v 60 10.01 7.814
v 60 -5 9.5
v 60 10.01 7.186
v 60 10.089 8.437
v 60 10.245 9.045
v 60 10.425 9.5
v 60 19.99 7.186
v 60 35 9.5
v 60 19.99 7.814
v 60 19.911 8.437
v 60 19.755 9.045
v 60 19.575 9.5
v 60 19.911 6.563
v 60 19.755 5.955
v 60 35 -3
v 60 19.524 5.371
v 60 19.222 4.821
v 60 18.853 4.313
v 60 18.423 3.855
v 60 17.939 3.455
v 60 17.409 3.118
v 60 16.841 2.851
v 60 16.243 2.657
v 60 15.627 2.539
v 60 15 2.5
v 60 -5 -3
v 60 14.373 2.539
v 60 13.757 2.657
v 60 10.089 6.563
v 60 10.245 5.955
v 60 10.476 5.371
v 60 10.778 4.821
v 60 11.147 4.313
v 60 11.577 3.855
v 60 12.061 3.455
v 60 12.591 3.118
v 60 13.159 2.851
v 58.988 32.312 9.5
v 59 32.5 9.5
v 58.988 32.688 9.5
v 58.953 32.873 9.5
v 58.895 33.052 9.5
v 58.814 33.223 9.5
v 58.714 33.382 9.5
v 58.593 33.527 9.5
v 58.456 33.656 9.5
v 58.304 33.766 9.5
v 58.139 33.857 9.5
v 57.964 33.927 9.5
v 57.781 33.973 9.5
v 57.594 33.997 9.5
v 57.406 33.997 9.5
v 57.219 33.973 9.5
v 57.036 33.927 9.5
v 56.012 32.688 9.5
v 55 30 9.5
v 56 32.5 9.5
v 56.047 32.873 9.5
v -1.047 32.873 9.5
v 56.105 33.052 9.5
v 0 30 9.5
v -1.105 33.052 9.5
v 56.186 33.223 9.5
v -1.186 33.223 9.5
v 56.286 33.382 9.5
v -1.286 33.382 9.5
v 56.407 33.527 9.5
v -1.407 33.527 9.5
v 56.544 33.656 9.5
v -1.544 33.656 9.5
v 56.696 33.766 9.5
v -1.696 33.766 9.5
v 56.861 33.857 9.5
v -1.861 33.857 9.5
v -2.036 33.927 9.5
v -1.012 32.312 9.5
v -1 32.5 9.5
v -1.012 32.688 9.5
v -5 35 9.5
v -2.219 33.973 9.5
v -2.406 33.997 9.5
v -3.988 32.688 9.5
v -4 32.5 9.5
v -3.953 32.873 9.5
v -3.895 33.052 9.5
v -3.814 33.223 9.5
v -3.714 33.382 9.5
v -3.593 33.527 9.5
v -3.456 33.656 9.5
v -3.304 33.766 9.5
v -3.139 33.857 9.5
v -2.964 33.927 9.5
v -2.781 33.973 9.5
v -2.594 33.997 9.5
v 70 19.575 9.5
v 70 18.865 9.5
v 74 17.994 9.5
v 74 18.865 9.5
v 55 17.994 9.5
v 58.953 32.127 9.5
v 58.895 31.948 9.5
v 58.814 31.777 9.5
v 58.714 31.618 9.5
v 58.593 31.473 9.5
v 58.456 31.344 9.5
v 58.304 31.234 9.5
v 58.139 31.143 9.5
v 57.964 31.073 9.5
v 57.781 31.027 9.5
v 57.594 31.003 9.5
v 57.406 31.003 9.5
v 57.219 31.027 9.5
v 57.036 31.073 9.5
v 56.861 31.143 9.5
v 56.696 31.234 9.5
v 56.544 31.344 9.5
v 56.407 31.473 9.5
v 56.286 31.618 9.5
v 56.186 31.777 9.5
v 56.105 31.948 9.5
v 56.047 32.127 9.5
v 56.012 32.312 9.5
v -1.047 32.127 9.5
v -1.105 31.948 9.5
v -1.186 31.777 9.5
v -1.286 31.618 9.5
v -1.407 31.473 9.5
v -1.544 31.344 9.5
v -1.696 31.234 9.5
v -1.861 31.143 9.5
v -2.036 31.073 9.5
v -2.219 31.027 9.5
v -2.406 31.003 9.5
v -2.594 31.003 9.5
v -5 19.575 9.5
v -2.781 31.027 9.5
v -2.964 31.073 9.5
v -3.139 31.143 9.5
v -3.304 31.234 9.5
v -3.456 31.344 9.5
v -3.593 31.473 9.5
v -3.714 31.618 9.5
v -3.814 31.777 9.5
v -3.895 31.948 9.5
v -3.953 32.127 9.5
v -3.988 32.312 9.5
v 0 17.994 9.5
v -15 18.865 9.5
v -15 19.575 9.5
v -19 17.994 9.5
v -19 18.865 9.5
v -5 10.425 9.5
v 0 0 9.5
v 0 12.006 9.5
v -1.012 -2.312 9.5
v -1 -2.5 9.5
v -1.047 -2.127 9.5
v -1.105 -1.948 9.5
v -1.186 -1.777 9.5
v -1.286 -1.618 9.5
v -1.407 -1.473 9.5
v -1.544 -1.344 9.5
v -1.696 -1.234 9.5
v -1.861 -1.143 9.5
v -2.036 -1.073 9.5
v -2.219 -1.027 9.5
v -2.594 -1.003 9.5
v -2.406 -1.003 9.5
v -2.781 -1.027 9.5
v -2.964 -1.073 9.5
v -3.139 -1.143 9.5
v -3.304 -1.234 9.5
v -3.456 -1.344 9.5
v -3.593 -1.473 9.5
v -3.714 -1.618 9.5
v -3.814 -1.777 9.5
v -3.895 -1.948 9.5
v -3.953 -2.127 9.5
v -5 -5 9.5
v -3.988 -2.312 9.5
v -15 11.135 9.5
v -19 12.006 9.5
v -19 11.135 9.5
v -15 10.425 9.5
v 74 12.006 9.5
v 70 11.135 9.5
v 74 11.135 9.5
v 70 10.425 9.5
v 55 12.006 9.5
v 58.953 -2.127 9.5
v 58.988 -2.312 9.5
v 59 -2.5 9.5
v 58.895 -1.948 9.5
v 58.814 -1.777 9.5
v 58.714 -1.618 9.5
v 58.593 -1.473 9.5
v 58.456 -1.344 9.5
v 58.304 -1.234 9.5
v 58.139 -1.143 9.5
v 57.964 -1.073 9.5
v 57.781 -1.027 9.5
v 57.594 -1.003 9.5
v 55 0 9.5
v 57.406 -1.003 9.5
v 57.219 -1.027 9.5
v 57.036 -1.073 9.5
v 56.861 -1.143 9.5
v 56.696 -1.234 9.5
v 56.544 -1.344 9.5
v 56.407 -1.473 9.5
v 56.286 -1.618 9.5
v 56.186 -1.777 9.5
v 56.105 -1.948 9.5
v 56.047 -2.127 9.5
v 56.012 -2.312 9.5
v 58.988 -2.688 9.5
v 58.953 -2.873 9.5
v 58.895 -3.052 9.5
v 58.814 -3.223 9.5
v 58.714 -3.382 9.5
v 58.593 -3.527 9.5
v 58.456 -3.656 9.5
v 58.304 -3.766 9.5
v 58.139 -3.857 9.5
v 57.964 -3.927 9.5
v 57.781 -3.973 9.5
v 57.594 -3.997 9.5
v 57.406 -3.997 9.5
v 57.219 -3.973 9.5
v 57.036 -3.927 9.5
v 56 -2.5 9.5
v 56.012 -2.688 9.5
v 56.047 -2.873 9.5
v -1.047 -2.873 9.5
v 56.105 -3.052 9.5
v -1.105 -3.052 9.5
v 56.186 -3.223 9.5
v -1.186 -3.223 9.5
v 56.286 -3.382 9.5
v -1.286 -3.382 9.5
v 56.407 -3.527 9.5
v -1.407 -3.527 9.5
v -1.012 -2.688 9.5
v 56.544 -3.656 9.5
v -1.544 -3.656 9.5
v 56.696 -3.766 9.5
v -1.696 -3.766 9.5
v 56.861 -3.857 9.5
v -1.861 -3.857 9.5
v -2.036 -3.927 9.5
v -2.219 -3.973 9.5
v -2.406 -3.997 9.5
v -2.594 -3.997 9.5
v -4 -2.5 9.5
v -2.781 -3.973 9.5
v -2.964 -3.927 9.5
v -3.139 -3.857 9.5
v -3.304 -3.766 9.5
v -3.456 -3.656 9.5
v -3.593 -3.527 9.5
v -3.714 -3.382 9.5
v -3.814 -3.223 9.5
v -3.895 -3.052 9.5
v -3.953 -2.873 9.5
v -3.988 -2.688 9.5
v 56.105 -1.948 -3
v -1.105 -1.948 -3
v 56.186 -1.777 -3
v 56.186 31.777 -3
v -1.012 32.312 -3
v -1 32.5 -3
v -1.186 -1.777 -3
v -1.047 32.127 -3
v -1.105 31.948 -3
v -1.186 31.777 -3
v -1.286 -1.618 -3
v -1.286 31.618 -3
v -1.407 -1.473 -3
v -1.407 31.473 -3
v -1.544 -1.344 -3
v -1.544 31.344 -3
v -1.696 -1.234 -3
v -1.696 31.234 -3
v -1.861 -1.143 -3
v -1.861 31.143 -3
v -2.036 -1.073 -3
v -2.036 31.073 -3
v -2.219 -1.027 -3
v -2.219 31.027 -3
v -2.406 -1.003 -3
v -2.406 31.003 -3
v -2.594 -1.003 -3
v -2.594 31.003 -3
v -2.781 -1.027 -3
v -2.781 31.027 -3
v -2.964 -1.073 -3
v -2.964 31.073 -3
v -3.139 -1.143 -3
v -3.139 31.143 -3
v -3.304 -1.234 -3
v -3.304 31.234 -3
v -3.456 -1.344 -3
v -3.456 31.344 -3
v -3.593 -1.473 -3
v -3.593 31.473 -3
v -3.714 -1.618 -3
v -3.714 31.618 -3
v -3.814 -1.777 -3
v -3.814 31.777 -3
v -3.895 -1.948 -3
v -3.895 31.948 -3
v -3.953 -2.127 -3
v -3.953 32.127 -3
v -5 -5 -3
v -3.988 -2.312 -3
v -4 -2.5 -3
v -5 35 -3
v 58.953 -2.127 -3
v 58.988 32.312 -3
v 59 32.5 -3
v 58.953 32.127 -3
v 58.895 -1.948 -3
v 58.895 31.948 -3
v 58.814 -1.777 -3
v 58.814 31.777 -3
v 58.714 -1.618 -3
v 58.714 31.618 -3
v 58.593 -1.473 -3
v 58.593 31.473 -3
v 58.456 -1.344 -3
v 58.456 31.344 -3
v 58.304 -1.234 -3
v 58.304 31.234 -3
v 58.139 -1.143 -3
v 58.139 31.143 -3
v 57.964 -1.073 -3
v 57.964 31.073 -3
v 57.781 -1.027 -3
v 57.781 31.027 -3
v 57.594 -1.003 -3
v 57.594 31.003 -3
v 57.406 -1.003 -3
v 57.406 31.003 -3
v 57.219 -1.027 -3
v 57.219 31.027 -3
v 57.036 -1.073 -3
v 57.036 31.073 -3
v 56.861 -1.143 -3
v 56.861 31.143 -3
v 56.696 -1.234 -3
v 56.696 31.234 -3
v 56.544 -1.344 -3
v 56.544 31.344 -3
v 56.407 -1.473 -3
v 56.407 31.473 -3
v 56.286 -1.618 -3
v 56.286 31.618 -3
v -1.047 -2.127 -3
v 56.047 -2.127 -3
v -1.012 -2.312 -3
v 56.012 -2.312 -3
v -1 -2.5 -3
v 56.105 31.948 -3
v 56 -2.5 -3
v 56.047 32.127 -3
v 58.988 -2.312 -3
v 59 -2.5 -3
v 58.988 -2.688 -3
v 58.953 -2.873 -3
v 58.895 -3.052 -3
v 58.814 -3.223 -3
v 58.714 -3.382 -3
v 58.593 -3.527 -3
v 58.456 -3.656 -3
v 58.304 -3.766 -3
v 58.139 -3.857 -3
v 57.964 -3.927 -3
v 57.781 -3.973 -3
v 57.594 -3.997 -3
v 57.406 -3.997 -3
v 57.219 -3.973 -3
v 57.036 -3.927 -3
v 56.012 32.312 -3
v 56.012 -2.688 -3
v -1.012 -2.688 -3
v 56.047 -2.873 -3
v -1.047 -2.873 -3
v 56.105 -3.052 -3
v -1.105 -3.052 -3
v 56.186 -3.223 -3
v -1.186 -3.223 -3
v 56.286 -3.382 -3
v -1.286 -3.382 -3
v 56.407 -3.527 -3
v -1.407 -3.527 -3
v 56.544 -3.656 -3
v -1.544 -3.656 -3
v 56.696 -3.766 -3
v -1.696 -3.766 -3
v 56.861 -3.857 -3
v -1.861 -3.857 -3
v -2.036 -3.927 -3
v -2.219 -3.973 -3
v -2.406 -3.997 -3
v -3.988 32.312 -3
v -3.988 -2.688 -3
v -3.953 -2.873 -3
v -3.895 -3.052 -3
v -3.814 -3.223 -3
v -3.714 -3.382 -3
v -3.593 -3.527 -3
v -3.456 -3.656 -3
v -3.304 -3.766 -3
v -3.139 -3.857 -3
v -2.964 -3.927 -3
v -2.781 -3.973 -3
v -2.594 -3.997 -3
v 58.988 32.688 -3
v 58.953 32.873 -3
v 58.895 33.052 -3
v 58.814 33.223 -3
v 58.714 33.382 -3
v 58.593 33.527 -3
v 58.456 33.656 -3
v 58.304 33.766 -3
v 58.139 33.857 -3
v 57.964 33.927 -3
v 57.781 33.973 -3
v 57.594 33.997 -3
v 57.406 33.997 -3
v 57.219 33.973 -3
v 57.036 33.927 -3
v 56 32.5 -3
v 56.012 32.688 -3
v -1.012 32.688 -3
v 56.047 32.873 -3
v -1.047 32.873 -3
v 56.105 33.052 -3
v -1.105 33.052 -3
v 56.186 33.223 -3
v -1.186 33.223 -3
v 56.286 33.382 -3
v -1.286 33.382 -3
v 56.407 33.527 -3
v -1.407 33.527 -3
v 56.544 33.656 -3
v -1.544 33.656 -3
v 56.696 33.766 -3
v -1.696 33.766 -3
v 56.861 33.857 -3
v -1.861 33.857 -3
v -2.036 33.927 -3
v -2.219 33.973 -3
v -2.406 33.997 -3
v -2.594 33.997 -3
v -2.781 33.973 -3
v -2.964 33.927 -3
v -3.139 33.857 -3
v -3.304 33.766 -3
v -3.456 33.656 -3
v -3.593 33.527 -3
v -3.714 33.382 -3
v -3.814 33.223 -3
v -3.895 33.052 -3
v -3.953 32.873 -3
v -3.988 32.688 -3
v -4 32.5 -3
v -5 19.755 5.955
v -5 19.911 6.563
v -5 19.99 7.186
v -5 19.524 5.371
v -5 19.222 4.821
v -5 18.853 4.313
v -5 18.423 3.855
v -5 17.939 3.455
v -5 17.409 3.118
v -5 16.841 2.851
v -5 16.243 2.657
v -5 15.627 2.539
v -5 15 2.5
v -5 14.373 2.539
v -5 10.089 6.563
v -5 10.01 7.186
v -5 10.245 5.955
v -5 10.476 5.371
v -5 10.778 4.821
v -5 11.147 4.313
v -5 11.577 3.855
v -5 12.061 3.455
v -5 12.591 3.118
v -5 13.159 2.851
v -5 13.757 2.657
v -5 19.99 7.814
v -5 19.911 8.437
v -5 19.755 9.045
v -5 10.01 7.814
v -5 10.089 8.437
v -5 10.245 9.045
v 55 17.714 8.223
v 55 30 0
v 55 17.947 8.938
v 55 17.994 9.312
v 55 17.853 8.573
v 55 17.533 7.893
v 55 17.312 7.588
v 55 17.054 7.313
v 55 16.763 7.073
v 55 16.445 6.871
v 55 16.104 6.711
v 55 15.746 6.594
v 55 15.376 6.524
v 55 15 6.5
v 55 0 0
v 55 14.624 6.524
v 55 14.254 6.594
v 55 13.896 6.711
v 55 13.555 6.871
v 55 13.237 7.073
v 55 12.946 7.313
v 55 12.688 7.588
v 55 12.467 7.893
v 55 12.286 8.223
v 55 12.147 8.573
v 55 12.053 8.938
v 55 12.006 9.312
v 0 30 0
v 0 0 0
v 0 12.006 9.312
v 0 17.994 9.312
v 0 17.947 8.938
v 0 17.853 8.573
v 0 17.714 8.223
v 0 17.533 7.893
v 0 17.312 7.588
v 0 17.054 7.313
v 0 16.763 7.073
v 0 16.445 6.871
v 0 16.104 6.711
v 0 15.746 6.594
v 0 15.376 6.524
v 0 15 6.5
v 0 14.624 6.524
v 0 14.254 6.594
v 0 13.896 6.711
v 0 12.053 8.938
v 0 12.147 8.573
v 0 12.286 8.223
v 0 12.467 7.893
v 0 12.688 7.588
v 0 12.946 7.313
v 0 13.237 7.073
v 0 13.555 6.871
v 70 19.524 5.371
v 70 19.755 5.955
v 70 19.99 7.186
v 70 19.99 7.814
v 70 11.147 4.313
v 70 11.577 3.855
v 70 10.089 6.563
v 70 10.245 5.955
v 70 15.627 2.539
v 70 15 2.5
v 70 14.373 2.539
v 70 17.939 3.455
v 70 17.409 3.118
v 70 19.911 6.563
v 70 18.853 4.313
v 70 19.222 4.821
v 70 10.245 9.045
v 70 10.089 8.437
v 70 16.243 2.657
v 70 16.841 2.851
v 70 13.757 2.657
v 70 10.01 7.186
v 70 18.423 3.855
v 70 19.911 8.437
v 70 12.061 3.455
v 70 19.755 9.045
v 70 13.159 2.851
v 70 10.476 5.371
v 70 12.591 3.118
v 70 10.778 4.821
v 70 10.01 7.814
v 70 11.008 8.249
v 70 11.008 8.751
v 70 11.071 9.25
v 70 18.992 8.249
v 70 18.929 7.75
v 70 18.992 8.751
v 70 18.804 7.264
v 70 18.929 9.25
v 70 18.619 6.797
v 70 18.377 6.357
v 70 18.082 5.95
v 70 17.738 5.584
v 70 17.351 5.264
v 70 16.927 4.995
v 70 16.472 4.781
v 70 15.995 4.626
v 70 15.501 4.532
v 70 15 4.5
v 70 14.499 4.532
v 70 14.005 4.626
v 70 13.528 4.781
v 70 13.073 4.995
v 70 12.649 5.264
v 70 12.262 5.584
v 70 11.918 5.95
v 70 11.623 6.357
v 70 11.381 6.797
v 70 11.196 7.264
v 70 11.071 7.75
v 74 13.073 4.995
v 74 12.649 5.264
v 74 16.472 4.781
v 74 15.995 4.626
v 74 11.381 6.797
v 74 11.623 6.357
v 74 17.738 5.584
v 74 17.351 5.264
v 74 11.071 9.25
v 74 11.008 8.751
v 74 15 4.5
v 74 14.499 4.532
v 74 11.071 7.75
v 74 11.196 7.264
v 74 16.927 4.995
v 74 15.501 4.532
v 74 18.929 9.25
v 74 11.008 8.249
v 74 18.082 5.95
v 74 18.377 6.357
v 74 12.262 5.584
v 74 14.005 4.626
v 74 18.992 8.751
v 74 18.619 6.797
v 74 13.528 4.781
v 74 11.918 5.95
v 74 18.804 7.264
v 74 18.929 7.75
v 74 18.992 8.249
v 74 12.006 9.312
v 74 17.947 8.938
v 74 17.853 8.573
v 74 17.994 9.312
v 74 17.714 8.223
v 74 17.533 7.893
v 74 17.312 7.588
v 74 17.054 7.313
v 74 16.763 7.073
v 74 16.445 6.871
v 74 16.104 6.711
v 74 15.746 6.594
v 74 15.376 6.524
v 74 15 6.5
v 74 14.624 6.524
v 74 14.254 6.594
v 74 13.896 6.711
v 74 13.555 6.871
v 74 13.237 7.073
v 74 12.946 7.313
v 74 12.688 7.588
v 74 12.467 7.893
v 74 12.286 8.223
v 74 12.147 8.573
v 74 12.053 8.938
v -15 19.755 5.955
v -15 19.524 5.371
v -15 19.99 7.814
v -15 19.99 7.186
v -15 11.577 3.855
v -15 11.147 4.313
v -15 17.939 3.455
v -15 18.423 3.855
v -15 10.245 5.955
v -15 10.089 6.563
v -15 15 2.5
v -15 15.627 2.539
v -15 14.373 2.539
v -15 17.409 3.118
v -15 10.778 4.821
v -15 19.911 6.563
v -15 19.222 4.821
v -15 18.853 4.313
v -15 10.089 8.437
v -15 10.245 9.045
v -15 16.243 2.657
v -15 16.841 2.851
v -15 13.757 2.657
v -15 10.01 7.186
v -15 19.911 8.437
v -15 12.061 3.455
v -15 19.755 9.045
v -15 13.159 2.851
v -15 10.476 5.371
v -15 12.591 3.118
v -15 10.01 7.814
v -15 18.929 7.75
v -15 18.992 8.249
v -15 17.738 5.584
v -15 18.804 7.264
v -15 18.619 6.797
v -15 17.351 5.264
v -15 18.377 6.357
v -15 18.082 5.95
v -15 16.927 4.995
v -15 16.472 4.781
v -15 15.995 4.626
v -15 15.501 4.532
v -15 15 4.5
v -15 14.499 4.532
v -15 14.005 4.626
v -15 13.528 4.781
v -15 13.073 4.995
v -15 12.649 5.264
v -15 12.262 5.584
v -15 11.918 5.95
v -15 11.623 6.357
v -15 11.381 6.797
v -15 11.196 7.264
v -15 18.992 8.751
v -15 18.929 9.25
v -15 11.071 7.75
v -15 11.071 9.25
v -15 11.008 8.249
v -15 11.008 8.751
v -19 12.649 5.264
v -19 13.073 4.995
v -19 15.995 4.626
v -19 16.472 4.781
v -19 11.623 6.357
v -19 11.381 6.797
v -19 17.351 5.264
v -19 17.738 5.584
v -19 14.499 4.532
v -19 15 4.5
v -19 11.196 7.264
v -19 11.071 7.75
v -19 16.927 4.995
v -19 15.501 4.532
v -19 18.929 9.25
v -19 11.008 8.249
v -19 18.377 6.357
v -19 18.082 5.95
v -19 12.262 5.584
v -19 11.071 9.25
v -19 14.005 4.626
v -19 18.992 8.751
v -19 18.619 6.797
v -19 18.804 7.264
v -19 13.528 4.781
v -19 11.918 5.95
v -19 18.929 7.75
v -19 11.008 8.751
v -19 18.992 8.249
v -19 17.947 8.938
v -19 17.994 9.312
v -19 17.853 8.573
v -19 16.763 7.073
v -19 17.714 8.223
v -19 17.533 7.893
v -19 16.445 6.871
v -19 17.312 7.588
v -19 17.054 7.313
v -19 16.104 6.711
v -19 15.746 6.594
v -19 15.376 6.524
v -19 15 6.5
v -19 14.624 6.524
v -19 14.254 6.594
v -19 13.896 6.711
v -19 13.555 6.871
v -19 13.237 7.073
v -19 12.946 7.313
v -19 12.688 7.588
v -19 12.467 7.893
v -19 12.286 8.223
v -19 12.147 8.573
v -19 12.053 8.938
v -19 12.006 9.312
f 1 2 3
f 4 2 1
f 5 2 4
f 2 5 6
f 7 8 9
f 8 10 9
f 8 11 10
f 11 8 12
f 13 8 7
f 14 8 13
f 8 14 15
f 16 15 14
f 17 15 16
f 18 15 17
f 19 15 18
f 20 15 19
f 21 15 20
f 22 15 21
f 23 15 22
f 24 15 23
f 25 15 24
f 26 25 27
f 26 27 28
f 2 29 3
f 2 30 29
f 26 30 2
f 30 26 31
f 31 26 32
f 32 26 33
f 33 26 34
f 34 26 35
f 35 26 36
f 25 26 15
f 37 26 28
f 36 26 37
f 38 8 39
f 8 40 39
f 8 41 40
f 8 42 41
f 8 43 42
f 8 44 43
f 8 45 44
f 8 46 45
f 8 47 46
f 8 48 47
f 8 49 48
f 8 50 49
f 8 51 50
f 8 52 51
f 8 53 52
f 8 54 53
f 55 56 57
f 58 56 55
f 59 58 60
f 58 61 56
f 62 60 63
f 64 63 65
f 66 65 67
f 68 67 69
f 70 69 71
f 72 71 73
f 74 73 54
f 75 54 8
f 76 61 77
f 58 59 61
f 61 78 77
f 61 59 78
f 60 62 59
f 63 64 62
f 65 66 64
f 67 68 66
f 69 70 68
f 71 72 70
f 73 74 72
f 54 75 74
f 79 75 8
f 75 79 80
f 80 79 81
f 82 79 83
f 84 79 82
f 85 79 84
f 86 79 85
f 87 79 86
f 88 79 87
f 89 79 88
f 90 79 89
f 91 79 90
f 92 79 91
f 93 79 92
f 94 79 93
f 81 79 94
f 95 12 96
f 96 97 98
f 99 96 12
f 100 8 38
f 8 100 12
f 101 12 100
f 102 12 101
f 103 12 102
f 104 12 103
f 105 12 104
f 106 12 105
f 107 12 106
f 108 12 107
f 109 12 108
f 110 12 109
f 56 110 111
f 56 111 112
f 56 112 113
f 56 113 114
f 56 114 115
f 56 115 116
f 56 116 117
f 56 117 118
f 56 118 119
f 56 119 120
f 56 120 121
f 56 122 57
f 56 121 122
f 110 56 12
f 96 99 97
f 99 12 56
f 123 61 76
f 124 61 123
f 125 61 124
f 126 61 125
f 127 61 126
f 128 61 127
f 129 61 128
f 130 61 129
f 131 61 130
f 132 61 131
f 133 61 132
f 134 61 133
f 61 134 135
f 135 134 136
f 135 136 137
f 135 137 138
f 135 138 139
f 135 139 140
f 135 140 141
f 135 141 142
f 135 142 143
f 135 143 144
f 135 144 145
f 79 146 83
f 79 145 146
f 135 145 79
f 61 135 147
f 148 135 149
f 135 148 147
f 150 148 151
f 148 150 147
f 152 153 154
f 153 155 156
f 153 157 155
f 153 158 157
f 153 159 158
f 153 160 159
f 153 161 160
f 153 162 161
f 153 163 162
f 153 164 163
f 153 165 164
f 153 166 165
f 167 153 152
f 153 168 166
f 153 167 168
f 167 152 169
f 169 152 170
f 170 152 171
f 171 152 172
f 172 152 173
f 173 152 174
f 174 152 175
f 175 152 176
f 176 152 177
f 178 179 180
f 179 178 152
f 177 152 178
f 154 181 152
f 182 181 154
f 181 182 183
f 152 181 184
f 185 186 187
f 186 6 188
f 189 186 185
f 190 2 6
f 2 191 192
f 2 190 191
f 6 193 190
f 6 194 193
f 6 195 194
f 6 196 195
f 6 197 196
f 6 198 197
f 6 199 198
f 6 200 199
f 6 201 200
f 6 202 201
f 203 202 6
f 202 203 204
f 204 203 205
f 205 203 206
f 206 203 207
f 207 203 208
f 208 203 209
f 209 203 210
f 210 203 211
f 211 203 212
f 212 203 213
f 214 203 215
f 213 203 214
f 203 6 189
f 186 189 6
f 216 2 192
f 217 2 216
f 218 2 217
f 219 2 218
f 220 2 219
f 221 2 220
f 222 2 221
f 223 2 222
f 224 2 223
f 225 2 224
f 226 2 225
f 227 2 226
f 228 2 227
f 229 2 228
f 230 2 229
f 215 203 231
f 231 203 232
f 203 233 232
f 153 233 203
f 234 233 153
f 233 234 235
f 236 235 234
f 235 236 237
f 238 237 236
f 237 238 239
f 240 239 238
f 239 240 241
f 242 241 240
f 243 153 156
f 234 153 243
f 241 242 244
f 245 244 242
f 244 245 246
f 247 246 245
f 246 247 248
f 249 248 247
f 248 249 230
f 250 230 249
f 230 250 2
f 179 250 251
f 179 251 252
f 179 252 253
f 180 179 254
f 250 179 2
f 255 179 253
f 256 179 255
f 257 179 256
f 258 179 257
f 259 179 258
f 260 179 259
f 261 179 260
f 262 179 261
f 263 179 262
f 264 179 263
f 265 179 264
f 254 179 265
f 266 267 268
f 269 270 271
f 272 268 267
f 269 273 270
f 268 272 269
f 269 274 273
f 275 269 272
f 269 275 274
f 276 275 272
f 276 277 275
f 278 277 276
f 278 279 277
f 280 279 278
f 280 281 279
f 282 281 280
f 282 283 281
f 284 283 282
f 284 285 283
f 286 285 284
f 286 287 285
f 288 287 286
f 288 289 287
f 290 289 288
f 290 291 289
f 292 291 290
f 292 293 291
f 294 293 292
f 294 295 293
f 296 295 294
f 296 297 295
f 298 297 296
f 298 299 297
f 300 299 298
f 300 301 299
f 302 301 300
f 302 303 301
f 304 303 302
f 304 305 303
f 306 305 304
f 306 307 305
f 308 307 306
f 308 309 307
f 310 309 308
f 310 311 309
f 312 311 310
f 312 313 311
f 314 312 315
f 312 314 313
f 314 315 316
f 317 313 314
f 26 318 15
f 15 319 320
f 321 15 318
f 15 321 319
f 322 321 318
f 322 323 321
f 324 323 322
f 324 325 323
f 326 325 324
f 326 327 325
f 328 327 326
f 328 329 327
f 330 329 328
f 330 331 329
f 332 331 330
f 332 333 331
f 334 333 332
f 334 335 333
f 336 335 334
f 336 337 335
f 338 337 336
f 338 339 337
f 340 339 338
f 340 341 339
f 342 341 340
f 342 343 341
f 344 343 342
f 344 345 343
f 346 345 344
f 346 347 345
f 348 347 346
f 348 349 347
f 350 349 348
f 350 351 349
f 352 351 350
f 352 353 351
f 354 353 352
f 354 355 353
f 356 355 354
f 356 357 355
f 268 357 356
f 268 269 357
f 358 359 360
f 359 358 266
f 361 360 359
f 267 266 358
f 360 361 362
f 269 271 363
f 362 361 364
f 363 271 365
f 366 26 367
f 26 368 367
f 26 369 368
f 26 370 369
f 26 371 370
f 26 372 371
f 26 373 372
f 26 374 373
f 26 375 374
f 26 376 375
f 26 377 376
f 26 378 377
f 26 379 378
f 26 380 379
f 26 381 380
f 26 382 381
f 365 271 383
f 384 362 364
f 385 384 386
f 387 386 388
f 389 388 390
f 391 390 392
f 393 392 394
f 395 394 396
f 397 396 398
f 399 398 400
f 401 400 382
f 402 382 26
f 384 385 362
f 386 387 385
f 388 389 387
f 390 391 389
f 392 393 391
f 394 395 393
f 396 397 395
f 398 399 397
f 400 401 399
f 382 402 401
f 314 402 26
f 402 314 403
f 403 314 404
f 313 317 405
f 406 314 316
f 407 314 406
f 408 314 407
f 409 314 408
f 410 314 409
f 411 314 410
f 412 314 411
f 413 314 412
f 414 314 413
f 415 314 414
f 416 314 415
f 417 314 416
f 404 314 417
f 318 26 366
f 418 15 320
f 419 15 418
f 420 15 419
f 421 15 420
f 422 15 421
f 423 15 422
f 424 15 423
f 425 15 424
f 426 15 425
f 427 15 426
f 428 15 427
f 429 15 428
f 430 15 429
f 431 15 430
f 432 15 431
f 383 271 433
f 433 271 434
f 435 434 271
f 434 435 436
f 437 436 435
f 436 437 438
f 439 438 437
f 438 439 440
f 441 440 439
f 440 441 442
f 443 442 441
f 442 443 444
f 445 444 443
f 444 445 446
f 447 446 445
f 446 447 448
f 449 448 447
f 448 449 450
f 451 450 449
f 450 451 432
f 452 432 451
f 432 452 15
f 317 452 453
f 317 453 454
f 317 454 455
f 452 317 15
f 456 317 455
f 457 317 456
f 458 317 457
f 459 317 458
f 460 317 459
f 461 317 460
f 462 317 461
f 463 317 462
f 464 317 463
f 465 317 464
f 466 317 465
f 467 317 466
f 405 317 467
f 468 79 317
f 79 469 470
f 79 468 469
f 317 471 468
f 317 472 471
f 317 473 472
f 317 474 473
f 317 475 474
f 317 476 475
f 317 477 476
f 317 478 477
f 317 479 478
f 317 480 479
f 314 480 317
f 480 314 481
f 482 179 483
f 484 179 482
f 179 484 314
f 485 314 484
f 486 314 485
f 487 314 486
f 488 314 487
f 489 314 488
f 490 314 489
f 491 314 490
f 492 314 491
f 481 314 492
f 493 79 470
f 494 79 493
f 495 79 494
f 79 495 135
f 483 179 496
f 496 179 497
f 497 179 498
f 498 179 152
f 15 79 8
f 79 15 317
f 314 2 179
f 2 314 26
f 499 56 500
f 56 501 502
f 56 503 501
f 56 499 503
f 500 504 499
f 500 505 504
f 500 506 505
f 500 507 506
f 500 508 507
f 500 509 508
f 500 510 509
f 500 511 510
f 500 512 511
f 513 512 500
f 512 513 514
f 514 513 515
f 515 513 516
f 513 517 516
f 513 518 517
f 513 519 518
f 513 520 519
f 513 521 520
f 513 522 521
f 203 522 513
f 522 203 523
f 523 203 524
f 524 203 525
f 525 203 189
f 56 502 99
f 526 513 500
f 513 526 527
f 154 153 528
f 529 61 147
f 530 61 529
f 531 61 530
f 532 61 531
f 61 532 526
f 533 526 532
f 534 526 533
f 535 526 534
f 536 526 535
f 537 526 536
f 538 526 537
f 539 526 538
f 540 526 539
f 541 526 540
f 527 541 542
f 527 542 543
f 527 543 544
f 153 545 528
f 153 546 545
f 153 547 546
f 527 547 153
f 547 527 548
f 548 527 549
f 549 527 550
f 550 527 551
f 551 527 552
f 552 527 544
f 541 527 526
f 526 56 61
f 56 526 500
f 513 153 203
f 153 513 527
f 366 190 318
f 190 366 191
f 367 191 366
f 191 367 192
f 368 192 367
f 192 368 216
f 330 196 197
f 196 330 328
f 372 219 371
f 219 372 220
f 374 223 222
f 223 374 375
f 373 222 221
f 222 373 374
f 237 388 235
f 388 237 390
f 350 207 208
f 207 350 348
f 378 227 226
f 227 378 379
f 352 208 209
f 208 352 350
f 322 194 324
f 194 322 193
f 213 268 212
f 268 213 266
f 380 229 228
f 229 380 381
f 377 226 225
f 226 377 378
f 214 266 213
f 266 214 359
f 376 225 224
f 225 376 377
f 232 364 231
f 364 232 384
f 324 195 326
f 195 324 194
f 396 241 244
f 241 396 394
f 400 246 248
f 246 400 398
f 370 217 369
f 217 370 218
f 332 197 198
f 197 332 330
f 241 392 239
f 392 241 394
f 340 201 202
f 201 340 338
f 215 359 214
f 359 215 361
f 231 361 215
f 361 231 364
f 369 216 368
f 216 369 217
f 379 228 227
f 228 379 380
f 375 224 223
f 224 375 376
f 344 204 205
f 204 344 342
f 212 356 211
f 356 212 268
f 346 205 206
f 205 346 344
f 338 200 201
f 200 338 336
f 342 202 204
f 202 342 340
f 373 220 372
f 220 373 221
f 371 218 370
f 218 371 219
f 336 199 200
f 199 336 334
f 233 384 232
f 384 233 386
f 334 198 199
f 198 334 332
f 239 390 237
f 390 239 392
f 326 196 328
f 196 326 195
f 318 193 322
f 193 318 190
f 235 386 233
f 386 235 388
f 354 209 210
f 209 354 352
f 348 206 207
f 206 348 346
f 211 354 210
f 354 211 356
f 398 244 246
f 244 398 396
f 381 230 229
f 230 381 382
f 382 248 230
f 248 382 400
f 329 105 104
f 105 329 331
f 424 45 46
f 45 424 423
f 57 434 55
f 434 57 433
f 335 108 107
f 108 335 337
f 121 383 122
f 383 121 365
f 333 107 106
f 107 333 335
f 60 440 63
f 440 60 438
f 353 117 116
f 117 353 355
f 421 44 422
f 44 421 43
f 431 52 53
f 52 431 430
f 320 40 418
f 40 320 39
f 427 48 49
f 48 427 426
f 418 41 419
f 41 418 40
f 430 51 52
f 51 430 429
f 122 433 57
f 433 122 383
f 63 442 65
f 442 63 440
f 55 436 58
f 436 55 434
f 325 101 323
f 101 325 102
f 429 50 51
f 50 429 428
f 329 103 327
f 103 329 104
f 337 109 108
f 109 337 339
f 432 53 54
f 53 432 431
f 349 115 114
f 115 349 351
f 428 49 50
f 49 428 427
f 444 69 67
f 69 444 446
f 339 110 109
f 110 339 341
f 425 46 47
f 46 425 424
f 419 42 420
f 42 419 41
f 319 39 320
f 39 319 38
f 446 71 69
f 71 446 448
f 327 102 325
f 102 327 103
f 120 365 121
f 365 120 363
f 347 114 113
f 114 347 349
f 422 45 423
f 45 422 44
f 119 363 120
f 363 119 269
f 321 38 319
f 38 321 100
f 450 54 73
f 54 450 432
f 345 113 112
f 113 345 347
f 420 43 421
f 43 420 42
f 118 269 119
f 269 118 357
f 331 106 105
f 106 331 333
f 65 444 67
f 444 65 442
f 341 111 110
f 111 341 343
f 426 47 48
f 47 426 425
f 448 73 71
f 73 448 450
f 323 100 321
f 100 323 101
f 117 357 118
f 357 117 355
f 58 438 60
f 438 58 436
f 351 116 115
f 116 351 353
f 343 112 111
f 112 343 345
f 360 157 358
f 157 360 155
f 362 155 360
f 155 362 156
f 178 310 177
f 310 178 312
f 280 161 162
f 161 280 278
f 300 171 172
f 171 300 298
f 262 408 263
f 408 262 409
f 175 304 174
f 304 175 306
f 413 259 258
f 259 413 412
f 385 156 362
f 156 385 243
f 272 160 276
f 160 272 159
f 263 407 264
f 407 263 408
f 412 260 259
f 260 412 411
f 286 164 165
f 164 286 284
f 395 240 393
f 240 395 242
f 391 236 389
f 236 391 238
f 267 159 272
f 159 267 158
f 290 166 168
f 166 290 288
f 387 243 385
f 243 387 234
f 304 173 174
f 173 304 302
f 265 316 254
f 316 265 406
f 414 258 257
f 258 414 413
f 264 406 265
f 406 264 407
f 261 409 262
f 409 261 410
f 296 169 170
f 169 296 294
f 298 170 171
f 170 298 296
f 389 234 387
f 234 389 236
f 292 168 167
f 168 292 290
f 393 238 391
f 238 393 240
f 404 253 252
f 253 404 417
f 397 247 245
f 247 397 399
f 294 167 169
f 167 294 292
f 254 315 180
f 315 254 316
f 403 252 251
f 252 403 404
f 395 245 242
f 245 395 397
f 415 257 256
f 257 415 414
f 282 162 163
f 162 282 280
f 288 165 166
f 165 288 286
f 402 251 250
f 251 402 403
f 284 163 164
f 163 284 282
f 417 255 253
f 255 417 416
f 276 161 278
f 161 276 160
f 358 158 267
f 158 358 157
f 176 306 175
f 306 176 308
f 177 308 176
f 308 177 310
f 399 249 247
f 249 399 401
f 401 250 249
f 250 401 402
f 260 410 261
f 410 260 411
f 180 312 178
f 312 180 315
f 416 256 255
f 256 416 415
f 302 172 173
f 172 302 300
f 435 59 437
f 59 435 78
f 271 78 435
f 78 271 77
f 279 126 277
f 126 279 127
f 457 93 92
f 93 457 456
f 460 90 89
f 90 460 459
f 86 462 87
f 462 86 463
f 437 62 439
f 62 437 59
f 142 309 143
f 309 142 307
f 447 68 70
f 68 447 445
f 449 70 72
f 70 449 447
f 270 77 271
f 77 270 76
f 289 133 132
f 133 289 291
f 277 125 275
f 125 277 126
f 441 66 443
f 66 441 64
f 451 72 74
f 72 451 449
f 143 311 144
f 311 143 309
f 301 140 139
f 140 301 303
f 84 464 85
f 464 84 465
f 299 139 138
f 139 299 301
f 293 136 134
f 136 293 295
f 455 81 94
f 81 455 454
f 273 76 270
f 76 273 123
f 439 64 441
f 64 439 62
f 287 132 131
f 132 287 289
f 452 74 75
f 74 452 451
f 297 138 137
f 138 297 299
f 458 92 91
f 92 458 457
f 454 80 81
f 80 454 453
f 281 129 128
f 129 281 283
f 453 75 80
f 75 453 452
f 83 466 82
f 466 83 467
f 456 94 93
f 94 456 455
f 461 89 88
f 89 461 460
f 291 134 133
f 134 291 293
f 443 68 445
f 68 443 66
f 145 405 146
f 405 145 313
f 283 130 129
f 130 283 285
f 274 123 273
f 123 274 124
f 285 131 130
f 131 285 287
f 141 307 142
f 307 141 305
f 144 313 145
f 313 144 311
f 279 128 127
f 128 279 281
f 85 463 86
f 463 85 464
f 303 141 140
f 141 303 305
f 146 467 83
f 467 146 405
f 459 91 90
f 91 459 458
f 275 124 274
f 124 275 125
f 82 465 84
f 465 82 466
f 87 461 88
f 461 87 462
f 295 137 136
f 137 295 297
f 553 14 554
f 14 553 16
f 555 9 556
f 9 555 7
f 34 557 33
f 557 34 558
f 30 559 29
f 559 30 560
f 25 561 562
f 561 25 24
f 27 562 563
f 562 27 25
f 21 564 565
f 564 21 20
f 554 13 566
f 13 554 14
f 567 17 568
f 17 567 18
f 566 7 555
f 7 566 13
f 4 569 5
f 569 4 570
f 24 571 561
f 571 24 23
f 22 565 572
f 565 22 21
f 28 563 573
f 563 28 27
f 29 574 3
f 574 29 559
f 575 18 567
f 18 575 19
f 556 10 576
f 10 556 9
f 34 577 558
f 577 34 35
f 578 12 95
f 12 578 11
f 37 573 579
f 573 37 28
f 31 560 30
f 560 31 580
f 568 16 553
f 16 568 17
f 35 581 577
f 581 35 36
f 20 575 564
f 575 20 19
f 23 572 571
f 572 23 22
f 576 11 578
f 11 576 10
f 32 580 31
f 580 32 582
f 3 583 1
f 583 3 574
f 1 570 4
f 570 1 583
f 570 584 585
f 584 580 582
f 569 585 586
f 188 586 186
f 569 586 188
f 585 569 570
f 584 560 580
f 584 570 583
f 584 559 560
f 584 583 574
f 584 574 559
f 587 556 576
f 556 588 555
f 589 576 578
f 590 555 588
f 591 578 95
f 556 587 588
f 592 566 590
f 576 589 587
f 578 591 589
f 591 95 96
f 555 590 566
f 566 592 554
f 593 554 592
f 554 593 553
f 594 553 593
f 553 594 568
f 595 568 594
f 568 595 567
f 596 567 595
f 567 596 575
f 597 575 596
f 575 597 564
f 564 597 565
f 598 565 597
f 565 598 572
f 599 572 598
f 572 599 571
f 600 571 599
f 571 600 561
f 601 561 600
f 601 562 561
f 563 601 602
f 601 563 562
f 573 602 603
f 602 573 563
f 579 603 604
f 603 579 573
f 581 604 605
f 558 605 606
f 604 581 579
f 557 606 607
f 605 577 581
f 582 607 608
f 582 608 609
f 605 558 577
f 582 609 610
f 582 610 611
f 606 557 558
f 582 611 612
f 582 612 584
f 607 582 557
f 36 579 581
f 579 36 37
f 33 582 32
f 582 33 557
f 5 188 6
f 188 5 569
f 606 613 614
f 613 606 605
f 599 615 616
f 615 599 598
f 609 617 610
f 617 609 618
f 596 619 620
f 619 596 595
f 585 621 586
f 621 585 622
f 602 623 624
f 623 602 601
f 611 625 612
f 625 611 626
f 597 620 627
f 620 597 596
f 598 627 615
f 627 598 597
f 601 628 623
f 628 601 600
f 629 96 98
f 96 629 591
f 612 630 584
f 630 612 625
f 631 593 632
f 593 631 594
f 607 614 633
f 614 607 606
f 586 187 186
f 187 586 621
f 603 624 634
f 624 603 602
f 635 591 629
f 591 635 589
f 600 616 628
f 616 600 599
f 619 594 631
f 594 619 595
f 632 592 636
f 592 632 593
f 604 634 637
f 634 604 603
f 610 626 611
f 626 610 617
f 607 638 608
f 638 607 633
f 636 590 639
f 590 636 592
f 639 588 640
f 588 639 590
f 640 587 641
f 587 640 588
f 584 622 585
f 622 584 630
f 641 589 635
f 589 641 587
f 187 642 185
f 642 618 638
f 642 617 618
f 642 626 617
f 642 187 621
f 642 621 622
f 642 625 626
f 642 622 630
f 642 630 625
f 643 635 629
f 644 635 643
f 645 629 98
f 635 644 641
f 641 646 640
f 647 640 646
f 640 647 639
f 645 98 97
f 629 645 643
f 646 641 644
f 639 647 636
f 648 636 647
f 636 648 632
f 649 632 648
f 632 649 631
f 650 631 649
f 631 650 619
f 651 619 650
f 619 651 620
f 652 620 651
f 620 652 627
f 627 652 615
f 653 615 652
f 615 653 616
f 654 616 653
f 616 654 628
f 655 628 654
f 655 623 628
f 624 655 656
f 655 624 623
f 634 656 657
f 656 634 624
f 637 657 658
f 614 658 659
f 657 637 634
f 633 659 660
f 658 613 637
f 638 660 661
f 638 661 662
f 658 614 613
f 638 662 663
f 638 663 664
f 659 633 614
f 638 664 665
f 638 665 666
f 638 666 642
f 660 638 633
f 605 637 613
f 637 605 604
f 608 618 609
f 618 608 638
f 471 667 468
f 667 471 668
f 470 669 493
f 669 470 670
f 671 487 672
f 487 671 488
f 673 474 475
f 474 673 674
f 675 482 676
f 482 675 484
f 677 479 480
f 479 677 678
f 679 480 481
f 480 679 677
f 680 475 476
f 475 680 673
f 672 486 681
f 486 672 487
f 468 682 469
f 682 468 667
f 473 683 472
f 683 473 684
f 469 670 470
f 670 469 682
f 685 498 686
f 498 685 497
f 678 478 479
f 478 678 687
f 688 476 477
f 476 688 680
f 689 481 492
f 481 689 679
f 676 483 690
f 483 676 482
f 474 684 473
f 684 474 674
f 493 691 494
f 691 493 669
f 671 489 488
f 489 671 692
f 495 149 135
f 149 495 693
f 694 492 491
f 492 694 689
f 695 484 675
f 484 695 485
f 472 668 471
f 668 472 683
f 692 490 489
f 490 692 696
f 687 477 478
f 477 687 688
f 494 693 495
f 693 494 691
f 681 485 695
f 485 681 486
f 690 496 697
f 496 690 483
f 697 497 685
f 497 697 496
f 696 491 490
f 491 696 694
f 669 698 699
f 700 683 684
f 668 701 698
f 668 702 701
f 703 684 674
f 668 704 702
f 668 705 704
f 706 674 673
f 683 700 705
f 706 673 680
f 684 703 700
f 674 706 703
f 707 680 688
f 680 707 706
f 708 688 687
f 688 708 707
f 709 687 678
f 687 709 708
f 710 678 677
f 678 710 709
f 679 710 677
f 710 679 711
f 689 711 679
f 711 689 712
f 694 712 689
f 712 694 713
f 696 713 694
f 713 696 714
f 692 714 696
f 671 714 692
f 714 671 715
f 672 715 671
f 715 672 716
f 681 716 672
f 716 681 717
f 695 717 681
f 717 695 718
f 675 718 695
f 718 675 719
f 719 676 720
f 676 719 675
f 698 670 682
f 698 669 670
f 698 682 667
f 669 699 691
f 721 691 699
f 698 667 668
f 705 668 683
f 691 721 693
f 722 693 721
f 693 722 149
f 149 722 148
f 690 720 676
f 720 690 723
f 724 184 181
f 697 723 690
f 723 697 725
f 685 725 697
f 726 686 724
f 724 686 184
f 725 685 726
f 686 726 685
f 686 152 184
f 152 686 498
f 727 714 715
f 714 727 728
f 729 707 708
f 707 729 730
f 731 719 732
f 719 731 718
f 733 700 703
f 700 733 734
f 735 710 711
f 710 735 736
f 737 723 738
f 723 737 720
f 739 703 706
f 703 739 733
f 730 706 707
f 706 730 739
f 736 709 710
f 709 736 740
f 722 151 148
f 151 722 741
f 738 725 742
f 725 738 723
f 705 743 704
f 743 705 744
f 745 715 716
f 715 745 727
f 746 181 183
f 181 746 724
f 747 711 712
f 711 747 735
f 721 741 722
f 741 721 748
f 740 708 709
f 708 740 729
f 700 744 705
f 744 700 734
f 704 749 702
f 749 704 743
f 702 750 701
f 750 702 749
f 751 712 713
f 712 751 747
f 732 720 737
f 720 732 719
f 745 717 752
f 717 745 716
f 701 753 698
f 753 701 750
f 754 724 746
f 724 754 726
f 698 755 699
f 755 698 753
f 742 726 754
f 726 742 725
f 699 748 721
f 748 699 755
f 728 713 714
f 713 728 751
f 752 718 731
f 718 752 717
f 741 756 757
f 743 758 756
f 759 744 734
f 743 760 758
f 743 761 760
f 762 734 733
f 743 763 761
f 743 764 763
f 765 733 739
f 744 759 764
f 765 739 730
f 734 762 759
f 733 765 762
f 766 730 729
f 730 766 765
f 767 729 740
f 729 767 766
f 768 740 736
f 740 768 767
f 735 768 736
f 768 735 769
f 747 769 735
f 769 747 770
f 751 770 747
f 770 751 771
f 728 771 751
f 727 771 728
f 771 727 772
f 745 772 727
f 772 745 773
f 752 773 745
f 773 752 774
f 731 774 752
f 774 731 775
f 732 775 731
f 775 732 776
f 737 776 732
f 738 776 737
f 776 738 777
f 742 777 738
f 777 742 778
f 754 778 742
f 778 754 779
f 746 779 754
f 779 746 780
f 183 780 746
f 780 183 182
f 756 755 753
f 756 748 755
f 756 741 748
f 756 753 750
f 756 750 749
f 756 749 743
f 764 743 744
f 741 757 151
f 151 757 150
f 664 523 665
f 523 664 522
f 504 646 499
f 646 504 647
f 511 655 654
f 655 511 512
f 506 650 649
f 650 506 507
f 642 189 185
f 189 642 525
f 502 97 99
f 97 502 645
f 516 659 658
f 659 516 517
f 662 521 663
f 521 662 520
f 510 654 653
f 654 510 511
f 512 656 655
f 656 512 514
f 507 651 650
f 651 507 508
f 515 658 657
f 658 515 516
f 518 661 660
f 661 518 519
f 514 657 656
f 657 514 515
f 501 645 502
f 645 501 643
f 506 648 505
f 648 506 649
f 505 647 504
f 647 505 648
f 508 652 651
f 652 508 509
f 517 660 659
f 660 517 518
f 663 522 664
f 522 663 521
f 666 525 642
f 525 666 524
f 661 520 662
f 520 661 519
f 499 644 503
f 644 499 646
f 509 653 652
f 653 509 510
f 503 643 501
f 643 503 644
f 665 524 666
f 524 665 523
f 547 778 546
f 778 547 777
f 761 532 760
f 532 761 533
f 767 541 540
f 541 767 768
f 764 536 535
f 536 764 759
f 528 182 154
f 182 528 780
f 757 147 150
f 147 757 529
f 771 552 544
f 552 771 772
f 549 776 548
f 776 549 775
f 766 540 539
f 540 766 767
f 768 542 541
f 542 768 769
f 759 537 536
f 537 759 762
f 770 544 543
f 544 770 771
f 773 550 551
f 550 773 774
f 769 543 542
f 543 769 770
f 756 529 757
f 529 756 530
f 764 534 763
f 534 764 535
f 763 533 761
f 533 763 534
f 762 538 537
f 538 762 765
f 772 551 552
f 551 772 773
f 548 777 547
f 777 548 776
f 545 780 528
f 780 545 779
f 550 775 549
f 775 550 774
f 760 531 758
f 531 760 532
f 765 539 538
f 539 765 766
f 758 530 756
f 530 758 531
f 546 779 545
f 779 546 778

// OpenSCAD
/*
 * ----------------------------------------------------------------------------
 * "THE BEER-WARE LICENSE" (Revision 42):
 * Stephane BARTHELEMY <stephane@sbarthelemy.com> wrote this file. 
 * As long as you retain this notice you
 * can do whatever you want with this stuff. If we meet some day, and you think
 * this stuff is worth it, you can buy me a beer in return Stéphane BARTHELEMY
 * ----------------------------------------------------------------------------
 */
 
 /*
 * ----------------------------------------------------------------------------
 * "LICENCE BEERWARE" (Révision 42):
 * Stephane BARTHELEMY <stephane@sbarthelemy.com> a créé ce fichier. 
 * Tant que vous conservez cet avertissement,
 * vous pouvez faire ce que vous voulez de ce truc. Si on se rencontre un jour et
 * que vous pensez que ce truc vaut le coup, vous pouvez me payer une bière en
 * retour. Stéphane BARTHELEMY
 * ----------------------------------------------------------------------------
 */
 

//Length
l = 55 ;
//width
w = 30;
//Height ( print half of height
h = 25 ;
// Thicknesss
e = 5;
// Radius screw
vis=1.5;
// Bottom
fond =3;
// Radius cable
fil = 3;

$fn=50;

difference ()
{
    union () 
    {
        difference ()
        {
            translate ([-e,-e,-fond]) cube ([l+10,w+10,h/2]) ; 
            cube ([l,w,h/2]);
            translate ([l+(e/2),-e/2,-e*2]) cylinder (r1=vis, r2=vis, h=w+(e*2));
            translate ([l+(e/2),w+(e/2),-e*2]) cylinder (r1=vis, r2=vis, h=w+(e*2));
            translate ([-e/2,-e/2,-e*2]) cylinder (r1=vis, r2=vis, h=w+(e*2));
            translate ([-e/2,w + (e/2),-e*2]) cylinder (r1=vis, r2=vis, h=w+(e*2));
        }
        translate ([l+(fil+2),w/2,(h/2)-(fil+2)]) rotate ([0,90,0]) cylinder (r1=(fil+2), r2=(fil+2),10);
        translate ([l+(fil+1),w/2,(h/2)-(fil+1)]) rotate ([0,90,0]) cylinder (r1=(fil+1), r2=(fil+1),15);
        translate ([-10-(fil+2),w/2,(h/2)-(fil+2)]) rotate ([0,90,0]) cylinder (r1=(fil+2), r2=(fil+2),10);
        translate ([-15-(fil+1),w/2,(h/2)-(fil+1)]) rotate ([0,90,0]) cylinder (r1=(fil+1), r2=(fil+1),15);
    }
        translate ([l+(fil)-e,w/2,(h/2)-(fil)]) rotate ([0,90,0]) cylinder (r1=(fil), r2=(fil),15+(2*e));
        translate ([-20-(fil),w/2,(h/2)-(fil)]) rotate ([0,90,0]) cylinder (r1=(fil), r2=(fil),15+(2*e));
    translate ([-e-15,-e,(h/2)-fond]) cube ([l+10+35,w+10,h/2]) ; 
    
}
